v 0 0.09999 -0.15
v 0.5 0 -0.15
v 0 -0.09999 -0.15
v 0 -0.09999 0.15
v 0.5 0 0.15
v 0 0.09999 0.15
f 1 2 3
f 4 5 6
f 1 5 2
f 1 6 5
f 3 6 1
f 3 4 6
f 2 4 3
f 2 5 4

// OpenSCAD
//creating triangle

linear_extrude(height = 0.3, center = true) {
polygon(points=[[0,0.1],[0,-0.1],[0.5,0]], paths=[[0,1,2]]);
    
}
